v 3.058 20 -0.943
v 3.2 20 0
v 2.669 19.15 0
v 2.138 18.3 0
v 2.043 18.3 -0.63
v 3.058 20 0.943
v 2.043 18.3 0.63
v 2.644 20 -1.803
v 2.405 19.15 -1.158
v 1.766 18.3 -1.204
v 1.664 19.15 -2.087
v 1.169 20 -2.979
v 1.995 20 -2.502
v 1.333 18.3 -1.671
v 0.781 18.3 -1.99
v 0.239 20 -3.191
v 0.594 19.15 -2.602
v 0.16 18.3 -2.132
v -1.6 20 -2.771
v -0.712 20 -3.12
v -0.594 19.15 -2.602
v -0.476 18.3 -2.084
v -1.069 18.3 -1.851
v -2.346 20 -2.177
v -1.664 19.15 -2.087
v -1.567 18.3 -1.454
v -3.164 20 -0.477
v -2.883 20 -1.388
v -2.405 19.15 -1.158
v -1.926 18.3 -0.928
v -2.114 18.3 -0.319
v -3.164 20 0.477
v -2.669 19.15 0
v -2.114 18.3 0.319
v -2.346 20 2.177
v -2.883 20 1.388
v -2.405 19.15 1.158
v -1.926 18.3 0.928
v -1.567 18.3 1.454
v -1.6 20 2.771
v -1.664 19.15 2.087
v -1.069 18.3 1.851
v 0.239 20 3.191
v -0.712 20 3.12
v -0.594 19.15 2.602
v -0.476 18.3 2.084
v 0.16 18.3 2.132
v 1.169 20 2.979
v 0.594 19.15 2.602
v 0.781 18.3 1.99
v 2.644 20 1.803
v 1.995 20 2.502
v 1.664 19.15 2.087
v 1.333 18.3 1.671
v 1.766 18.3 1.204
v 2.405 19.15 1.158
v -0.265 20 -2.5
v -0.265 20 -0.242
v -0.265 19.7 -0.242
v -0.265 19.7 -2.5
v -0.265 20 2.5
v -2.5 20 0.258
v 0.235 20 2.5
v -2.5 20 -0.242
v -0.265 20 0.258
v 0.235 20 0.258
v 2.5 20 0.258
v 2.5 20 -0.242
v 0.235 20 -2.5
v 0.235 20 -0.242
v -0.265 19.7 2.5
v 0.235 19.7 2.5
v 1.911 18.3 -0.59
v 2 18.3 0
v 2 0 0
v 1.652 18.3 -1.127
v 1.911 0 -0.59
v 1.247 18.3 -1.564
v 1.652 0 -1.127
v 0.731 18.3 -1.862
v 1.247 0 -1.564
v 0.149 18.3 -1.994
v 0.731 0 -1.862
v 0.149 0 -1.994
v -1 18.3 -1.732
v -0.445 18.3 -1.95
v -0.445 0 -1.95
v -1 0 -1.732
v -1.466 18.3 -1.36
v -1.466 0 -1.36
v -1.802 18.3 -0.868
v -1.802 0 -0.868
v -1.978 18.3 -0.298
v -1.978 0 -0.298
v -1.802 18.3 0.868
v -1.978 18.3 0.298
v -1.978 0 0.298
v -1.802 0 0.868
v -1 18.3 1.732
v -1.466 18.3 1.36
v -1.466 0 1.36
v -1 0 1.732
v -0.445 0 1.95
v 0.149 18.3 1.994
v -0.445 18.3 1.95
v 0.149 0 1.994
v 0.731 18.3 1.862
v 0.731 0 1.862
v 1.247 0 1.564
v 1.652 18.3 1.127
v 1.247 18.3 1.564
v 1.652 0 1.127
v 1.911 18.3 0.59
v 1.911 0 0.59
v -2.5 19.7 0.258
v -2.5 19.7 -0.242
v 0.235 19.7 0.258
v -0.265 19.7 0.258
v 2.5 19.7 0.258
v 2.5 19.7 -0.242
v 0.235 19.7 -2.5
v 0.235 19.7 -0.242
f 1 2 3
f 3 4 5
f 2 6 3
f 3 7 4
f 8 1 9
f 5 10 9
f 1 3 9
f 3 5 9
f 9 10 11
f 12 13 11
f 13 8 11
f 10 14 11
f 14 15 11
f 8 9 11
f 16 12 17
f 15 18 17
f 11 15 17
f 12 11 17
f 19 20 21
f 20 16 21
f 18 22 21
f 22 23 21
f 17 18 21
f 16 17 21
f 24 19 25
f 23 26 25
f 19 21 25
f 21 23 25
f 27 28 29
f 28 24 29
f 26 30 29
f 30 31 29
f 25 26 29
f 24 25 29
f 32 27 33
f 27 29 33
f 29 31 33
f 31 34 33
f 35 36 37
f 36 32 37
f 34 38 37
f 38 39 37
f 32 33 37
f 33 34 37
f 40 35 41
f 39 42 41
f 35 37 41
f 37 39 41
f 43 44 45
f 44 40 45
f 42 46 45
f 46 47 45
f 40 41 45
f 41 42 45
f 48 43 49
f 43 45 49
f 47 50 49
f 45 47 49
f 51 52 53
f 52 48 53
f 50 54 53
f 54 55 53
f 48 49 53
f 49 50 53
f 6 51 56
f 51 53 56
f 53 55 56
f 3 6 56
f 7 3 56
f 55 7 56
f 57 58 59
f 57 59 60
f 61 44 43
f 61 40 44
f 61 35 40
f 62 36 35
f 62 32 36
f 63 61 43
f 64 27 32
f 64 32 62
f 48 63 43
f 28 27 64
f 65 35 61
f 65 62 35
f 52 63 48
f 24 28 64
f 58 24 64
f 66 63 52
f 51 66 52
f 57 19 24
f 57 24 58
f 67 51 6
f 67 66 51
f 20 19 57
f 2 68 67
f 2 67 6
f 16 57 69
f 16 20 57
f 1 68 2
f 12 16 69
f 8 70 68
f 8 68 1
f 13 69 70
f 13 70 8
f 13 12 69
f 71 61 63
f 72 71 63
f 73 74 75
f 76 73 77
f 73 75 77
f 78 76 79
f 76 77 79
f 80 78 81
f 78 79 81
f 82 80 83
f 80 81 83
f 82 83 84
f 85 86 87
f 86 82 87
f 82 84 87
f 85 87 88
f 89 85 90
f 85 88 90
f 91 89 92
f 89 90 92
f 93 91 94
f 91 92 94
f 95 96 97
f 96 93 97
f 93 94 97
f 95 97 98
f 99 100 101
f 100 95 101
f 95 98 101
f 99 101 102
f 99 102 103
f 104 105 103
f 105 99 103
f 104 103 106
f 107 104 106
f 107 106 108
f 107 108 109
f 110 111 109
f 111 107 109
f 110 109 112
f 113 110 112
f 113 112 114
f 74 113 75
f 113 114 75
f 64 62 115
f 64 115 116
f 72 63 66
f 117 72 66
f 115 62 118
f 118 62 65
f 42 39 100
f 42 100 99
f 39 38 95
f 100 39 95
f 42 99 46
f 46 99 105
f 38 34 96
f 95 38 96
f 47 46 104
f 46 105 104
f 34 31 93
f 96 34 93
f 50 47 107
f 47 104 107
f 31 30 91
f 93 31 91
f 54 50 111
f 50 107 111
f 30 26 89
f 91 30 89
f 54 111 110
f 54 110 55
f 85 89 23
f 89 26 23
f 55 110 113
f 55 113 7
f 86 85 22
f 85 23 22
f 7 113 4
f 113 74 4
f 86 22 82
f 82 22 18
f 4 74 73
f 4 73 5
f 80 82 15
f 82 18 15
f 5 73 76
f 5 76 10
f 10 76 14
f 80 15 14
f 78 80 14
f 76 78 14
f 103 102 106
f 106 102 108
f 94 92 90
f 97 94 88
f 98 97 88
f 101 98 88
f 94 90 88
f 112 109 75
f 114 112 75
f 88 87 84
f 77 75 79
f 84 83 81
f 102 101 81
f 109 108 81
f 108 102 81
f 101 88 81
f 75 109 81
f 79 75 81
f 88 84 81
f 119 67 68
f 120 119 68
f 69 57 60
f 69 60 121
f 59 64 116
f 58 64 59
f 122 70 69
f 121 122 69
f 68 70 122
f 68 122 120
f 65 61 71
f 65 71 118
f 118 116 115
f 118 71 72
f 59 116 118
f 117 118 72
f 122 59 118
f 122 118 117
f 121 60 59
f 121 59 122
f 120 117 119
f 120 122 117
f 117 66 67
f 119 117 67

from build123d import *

# Parameters (mm, degrees)
SKETCH1_R           = 2
BOSS_EXTRUDE1_DEPTH = 20
SKETCH2_R           = 3.2
BOSS_EXTRUDE2_DEPTH = 1.7
BOSS_EXTRUDE2_TAPER = 32
SKETCH3_W           = 0.5
SKETCH3_H           = 2.258378485
SKETCH3_H_2         = 2.241621515
SKETCH3_W_2         = 2.234727157
SKETCH3_H_3         = 0.5
SKETCH3_W_3         = 2.265272843
CUT_EXTRUDE1_DEPTH  = 0.3


with BuildPart() as part:
    # Sketch1 → Boss-Extrude1 (new body)
    with BuildSketch(Plane(origin=(0, 0, 0), x_dir=(1, 0, 0), z_dir=(0, 1, 0))):
        Circle(SKETCH1_R)
    extrude(amount=BOSS_EXTRUDE1_DEPTH)

    # Sketch2 → Boss-Extrude2 (add)
    with BuildSketch(Plane(origin=(0, 20, 0), x_dir=(1, 0, 0), z_dir=(0, 1, 0))):
        Circle(SKETCH2_R)
    extrude(amount=-BOSS_EXTRUDE2_DEPTH, taper=BOSS_EXTRUDE2_TAPER)

    # Sketch3 → Cut-Extrude1 (cut)
    with BuildSketch(Plane(origin=(0, 20, 0), x_dir=(1, 0, 0), z_dir=(0, 1, 0))):
        with Locations((-0.015272843, 1.370810757)):
            Rectangle(SKETCH3_W, SKETCH3_H)
        with Locations((-0.015272843, -1.379189243)):
            Rectangle(SKETCH3_W, SKETCH3_H_2)
        with Locations((-1.382636421, -0.008378485)):
            Rectangle(SKETCH3_W_2, SKETCH3_H_3)
        with Locations((1.367363579, -0.008378485)):
            Rectangle(SKETCH3_W_3, SKETCH3_H_3)
        with Locations((-0.015272843, -0.008378485)):
            Rectangle(SKETCH3_W, SKETCH3_H_3)
    extrude(amount=-CUT_EXTRUDE1_DEPTH, mode=Mode.SUBTRACT)


solid = part.part
